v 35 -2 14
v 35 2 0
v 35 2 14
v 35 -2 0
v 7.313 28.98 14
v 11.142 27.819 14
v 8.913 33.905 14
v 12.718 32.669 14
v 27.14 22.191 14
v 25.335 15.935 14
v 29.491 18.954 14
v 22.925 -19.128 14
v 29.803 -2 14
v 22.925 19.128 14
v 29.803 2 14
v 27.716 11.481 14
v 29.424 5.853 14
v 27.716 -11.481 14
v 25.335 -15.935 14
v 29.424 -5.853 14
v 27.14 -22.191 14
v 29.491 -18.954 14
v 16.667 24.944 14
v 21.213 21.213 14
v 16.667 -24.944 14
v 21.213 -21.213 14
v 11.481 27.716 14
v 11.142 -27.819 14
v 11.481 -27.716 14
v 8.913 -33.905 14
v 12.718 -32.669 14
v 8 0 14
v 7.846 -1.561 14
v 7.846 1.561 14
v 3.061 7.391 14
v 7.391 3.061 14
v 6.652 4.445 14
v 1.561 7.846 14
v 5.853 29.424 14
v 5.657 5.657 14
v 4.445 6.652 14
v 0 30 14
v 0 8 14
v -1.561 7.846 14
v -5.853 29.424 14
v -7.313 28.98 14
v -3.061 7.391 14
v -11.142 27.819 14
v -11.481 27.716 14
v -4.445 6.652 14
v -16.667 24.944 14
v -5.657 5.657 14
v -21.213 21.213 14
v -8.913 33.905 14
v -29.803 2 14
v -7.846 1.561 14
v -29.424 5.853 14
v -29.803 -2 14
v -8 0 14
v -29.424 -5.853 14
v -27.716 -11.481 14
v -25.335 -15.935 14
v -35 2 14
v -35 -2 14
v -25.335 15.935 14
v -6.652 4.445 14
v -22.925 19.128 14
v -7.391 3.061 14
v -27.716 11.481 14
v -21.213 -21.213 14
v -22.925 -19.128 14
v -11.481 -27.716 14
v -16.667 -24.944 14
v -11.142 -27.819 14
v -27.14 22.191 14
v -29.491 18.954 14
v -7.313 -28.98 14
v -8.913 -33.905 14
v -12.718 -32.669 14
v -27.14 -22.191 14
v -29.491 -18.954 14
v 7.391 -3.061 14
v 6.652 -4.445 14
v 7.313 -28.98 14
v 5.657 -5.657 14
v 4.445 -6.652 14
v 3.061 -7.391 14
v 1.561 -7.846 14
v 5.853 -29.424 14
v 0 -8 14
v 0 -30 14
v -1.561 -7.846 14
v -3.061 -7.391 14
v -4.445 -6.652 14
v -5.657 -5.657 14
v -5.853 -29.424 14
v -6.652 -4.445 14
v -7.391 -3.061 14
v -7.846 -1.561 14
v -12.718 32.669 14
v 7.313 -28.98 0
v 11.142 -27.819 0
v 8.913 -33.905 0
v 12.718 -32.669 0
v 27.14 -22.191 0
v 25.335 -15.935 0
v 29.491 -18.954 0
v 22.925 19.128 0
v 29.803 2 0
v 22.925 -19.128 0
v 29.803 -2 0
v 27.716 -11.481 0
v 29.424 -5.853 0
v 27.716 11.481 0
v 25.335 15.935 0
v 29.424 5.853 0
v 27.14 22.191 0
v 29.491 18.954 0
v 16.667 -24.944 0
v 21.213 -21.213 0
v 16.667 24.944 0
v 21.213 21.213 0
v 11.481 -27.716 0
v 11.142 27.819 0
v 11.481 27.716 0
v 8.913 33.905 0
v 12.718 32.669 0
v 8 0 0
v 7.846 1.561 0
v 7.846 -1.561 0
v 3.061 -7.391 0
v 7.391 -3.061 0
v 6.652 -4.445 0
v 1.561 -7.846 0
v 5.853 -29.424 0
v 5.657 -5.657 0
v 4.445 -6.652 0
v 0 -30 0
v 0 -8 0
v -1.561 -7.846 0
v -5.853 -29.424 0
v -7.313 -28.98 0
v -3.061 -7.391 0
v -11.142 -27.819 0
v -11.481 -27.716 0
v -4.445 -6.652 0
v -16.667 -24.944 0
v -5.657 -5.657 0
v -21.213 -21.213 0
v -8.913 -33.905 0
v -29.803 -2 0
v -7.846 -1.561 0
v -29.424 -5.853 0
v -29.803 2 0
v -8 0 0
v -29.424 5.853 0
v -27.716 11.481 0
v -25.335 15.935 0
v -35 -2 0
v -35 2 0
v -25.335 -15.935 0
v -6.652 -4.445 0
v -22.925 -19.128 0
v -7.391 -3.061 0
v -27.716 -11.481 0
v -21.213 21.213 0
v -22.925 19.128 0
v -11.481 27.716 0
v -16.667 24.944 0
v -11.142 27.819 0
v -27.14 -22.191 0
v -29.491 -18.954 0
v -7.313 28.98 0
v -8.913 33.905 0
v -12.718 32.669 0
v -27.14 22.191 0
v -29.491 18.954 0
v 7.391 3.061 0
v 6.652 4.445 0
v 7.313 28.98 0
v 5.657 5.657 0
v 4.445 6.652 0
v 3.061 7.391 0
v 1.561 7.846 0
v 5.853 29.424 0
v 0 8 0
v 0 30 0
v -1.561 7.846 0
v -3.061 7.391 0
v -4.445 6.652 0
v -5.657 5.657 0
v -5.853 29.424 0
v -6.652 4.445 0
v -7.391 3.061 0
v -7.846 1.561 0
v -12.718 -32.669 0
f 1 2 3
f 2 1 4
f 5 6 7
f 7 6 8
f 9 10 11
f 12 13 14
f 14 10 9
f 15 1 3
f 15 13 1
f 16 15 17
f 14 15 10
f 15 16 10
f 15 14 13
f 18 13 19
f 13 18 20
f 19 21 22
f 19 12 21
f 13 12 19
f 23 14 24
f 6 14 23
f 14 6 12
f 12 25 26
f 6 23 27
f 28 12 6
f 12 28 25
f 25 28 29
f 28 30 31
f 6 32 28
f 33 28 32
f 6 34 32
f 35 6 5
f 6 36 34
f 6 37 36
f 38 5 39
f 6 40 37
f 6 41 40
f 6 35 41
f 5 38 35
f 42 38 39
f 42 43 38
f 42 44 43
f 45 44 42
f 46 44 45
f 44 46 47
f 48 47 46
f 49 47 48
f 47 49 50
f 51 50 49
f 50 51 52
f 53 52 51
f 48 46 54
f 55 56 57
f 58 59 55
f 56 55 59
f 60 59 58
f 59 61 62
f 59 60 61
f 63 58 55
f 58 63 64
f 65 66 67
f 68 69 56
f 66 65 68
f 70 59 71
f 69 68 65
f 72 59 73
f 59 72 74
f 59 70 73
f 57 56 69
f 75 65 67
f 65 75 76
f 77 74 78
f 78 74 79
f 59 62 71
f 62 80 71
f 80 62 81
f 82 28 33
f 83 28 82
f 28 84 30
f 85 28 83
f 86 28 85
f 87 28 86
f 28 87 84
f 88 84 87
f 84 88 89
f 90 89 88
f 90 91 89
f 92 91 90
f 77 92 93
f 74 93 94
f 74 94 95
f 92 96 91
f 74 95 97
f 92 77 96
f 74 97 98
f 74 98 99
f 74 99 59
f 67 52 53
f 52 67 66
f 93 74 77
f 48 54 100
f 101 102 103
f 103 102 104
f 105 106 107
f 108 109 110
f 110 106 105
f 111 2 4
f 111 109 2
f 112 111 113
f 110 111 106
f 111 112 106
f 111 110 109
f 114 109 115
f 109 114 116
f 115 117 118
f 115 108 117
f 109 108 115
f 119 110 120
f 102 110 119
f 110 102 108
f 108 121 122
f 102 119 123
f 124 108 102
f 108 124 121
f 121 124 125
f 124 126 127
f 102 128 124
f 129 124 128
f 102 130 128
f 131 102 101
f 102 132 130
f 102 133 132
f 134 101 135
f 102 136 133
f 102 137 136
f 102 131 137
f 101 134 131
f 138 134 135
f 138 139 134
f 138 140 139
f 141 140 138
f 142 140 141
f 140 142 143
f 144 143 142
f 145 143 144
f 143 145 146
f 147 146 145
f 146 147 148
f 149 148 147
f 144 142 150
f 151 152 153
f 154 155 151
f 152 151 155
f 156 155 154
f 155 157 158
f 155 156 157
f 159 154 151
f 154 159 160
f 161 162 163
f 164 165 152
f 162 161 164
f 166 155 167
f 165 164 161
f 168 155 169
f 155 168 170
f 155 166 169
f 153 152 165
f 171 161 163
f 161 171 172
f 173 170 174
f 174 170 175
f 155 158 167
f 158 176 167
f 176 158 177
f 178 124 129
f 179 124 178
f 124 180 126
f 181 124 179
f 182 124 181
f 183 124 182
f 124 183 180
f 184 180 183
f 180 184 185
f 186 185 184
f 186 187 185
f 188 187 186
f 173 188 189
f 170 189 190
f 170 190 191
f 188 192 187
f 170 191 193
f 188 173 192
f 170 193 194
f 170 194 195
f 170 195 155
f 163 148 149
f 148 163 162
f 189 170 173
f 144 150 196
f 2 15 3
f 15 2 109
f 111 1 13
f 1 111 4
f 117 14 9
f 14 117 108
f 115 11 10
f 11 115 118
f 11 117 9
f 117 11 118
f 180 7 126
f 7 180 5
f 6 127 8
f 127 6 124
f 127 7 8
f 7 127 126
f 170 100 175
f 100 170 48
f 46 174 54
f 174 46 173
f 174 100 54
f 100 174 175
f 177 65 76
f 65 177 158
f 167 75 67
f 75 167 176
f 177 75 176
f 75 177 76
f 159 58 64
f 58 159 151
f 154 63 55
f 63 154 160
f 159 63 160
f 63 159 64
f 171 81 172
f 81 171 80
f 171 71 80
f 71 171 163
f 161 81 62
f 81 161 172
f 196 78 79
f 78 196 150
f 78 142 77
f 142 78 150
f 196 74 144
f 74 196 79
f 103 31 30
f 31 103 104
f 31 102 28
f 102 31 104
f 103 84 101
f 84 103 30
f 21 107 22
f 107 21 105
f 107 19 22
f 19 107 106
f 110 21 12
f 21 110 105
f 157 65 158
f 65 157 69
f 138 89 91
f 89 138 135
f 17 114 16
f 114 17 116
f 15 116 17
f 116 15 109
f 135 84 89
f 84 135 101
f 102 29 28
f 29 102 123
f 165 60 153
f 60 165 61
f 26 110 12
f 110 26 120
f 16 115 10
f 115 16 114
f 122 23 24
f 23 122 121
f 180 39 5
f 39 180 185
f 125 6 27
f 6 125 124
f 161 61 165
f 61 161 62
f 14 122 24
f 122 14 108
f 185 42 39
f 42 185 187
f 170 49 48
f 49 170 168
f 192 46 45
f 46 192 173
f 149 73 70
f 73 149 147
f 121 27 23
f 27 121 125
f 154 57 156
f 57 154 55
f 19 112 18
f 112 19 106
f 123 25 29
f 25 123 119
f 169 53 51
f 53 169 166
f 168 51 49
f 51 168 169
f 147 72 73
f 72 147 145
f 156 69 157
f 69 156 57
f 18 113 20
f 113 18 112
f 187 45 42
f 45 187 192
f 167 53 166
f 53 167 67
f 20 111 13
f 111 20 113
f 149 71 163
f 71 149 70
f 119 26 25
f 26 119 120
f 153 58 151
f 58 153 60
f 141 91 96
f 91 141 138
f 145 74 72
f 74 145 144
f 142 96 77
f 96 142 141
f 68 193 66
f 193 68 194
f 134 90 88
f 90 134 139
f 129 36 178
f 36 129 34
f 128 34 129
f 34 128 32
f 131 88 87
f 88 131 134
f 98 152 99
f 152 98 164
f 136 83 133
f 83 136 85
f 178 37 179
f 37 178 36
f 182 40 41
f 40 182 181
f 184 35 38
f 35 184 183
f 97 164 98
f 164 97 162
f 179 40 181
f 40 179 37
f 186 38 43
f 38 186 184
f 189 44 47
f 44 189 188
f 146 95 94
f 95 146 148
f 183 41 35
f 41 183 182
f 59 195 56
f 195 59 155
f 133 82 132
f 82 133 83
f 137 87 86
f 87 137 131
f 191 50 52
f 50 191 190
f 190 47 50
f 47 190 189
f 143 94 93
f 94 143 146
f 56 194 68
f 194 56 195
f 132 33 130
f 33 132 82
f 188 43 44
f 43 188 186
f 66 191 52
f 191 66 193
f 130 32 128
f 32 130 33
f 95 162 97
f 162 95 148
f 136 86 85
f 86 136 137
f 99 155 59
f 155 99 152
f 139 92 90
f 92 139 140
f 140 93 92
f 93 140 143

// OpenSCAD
$fn = 32;

// ----------------------------------------------------------------------
// Spur blank: bored gear blank
// ----------------------------------------------------------------------

// --- parameters (mm) ---
disc_r = 30;              // blank root radius
disc_t = 14;              // blank thickness
n_teeth = 10;             // stub tooth count
tooth_w = 4;              // tooth width at the root
tooth_h = 5;              // tooth height above the root
bore_r = 8;               // central bore radius

out_r = disc_r + tooth_h;  // tip radius
bbox_x = 70.0;  // measured width over the teeth
bbox_y = 67.81;  // measured depth over the teeth

difference() {
union() {
  cylinder(r = disc_r, h = disc_t);
  for (i = [0 : n_teeth - 1])
    rotate([0, 0, i * 360 / n_teeth])
      translate([disc_r - 1, -tooth_w / 2, 0])
        cube([tooth_h + 1, tooth_w, disc_t]);
}
  translate([0, 0, -1]) cylinder(r = bore_r, h = disc_t + 2);
}
